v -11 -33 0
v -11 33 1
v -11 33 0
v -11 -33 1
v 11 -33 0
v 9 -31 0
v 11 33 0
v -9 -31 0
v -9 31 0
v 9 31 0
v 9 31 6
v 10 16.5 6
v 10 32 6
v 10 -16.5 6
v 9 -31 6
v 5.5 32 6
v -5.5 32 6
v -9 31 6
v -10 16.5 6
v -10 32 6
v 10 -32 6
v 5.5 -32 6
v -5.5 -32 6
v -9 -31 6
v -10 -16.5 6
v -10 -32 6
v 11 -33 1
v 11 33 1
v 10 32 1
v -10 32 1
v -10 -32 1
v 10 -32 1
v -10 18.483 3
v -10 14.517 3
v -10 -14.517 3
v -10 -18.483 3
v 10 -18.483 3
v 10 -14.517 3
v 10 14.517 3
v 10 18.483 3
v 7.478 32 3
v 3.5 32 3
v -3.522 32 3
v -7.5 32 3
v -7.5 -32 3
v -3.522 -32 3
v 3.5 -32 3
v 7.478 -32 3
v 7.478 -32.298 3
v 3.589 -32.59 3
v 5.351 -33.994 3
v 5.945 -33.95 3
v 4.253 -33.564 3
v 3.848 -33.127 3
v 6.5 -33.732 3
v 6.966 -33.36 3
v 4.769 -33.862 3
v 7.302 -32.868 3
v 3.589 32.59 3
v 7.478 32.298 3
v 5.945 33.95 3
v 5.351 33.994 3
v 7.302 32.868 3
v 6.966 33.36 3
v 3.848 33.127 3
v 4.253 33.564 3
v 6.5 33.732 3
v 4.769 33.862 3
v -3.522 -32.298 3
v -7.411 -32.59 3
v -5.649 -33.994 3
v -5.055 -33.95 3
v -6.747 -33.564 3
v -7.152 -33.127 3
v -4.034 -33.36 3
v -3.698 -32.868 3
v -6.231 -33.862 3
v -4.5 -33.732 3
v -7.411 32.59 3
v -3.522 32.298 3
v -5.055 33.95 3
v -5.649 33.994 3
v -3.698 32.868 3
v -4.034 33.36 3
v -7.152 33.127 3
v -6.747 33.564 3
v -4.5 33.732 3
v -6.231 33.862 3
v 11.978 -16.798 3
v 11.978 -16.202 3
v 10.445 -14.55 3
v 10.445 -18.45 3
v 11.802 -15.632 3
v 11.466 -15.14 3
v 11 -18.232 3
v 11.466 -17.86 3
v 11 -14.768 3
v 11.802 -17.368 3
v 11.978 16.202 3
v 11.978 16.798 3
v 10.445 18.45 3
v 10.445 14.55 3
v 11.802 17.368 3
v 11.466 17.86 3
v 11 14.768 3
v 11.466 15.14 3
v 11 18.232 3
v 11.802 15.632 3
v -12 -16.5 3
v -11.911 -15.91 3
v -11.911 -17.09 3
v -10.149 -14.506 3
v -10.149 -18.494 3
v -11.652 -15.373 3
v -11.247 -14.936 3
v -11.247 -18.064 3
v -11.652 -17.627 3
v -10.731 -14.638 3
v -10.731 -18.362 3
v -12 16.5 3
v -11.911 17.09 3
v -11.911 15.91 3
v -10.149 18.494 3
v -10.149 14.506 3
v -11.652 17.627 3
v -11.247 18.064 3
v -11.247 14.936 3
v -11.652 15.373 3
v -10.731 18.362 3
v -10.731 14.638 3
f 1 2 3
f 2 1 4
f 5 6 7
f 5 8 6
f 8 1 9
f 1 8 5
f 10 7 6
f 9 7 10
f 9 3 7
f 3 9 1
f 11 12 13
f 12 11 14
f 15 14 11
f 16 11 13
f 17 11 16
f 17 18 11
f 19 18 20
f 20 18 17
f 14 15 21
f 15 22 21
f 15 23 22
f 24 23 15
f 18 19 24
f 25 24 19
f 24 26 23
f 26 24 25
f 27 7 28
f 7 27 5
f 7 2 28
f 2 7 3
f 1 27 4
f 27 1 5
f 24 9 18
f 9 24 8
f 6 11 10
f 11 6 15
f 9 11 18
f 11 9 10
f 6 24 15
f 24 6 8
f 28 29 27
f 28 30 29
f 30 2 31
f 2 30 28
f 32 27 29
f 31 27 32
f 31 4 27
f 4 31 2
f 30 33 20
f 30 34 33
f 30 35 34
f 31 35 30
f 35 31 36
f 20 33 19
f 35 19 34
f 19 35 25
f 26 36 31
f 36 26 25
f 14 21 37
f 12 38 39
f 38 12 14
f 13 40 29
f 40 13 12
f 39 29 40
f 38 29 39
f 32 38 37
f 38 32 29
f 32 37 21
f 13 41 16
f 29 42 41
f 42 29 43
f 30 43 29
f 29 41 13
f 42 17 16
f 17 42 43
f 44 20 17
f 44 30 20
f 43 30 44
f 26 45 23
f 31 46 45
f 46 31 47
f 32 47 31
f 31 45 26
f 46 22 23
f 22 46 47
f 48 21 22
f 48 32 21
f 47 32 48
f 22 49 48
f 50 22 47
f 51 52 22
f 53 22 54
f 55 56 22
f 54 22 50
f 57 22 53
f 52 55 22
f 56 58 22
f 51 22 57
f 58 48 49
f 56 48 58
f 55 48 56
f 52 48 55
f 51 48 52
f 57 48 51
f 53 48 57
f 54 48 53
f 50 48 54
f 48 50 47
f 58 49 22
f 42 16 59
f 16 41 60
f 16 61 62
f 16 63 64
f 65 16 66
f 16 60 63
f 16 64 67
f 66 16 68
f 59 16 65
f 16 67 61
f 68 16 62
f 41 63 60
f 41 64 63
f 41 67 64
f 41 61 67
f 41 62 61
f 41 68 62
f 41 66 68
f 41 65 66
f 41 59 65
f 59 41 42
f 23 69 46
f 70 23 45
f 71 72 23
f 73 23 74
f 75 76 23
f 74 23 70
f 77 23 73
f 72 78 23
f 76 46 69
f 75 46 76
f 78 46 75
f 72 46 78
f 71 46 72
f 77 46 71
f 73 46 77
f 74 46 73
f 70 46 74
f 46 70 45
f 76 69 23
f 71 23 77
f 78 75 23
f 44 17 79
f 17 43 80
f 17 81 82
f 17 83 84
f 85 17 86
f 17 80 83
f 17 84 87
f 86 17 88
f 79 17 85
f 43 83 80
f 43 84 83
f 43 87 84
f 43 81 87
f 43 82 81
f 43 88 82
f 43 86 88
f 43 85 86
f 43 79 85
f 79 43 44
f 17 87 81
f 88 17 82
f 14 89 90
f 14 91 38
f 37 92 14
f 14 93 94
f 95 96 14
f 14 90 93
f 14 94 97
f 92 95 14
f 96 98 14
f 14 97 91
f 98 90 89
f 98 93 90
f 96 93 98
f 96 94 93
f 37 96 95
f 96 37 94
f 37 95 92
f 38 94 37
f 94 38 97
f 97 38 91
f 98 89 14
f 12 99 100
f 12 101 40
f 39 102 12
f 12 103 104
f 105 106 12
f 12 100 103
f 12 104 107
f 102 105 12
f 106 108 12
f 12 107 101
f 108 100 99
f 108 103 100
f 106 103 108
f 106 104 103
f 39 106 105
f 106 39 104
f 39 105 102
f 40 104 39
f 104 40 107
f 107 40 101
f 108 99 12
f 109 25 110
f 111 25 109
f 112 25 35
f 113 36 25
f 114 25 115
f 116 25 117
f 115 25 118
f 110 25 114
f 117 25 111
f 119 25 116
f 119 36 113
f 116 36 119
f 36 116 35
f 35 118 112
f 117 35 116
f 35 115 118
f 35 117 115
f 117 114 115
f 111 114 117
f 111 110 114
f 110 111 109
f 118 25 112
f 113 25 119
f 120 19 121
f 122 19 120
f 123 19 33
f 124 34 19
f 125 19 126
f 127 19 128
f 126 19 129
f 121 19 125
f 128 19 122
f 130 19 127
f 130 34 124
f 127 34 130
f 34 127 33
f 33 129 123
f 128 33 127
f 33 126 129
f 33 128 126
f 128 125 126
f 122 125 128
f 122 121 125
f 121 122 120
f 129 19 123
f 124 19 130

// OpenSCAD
/*
Create a LCD frame for 3D printing
Create by Dave Borghuis / zeno4ever
Version : 1.0
Date : 10-02-2012
For sugestions email me at : zeno4ever@gmail.com
*/

//Size of LCD
lcd_horizontal = 62;
lcd_vertical = 18;

//border around the frame
lcd_frame = 4;

//hight of the frame
frame_hight = 6;

//for barb thickness of used material
material_thickness = 1; 

wall_thickness = 2*1; //wall thickness * 1 to disable for thiniverse customise

//internal parameters
frame_horizontal = lcd_horizontal+lcd_frame;
frame_vertical = lcd_vertical+lcd_frame;

barb_size = 2*1; //with of barb (top)
barb_size_b = 0; //with of barb (bottom) barb_size/2;

//set resolution
$fs = 0.6*1; 

//make frame
module makeframe () {
	difference () {
		difference () {	//inner frame
			cube(size = [frame_vertical,frame_horizontal,frame_hight],center=true);
			cube(size = [lcd_vertical,lcd_horizontal,frame_hight],center=true);
		}	

		translate([0,0,-wall_thickness]) difference () {	//outer frame
			cube(size = [frame_vertical+wall_thickness,frame_horizontal+wall_thickness,frame_hight+wall_thickness],center=true);
			cube(size = [lcd_vertical+wall_thickness,lcd_horizontal+wall_thickness,frame_hight+wall_thickness],center=true);
		}
	}

	//make barbs
	fz = -(frame_hight)/2;

	//side brad
	fx = frame_vertical/4;
	fy = (lcd_horizontal+wall_thickness)/2;

	//top/bottom brad
	fx2 = (lcd_vertical+wall_thickness)/2;
	fy2 = frame_horizontal/4;

	difference () {
		union () {
			for (factorx = [-1,1]) {
				for (factory = [-1,1]) {
					translate ([factorx*fx ,factory*fy,fz]) barb();
				}
			}

			for (factorx = [-1,1]) {
				for (factory = [-1,1]) {
					translate ([factorx*fx2 ,factory*fy2,fz]) barb();
				}
			}
		}
		cube(size = [lcd_vertical,lcd_horizontal,frame_hight],center=true);
	};
};


module barb() {
	cylinder(h = frame_hight-material_thickness-wall_thickness, r1 = barb_size_b, r2 = barb_size, center = false);
};


translate([0,0,frame_hight/2]) rotate ([0,180,0]) makeframe();
